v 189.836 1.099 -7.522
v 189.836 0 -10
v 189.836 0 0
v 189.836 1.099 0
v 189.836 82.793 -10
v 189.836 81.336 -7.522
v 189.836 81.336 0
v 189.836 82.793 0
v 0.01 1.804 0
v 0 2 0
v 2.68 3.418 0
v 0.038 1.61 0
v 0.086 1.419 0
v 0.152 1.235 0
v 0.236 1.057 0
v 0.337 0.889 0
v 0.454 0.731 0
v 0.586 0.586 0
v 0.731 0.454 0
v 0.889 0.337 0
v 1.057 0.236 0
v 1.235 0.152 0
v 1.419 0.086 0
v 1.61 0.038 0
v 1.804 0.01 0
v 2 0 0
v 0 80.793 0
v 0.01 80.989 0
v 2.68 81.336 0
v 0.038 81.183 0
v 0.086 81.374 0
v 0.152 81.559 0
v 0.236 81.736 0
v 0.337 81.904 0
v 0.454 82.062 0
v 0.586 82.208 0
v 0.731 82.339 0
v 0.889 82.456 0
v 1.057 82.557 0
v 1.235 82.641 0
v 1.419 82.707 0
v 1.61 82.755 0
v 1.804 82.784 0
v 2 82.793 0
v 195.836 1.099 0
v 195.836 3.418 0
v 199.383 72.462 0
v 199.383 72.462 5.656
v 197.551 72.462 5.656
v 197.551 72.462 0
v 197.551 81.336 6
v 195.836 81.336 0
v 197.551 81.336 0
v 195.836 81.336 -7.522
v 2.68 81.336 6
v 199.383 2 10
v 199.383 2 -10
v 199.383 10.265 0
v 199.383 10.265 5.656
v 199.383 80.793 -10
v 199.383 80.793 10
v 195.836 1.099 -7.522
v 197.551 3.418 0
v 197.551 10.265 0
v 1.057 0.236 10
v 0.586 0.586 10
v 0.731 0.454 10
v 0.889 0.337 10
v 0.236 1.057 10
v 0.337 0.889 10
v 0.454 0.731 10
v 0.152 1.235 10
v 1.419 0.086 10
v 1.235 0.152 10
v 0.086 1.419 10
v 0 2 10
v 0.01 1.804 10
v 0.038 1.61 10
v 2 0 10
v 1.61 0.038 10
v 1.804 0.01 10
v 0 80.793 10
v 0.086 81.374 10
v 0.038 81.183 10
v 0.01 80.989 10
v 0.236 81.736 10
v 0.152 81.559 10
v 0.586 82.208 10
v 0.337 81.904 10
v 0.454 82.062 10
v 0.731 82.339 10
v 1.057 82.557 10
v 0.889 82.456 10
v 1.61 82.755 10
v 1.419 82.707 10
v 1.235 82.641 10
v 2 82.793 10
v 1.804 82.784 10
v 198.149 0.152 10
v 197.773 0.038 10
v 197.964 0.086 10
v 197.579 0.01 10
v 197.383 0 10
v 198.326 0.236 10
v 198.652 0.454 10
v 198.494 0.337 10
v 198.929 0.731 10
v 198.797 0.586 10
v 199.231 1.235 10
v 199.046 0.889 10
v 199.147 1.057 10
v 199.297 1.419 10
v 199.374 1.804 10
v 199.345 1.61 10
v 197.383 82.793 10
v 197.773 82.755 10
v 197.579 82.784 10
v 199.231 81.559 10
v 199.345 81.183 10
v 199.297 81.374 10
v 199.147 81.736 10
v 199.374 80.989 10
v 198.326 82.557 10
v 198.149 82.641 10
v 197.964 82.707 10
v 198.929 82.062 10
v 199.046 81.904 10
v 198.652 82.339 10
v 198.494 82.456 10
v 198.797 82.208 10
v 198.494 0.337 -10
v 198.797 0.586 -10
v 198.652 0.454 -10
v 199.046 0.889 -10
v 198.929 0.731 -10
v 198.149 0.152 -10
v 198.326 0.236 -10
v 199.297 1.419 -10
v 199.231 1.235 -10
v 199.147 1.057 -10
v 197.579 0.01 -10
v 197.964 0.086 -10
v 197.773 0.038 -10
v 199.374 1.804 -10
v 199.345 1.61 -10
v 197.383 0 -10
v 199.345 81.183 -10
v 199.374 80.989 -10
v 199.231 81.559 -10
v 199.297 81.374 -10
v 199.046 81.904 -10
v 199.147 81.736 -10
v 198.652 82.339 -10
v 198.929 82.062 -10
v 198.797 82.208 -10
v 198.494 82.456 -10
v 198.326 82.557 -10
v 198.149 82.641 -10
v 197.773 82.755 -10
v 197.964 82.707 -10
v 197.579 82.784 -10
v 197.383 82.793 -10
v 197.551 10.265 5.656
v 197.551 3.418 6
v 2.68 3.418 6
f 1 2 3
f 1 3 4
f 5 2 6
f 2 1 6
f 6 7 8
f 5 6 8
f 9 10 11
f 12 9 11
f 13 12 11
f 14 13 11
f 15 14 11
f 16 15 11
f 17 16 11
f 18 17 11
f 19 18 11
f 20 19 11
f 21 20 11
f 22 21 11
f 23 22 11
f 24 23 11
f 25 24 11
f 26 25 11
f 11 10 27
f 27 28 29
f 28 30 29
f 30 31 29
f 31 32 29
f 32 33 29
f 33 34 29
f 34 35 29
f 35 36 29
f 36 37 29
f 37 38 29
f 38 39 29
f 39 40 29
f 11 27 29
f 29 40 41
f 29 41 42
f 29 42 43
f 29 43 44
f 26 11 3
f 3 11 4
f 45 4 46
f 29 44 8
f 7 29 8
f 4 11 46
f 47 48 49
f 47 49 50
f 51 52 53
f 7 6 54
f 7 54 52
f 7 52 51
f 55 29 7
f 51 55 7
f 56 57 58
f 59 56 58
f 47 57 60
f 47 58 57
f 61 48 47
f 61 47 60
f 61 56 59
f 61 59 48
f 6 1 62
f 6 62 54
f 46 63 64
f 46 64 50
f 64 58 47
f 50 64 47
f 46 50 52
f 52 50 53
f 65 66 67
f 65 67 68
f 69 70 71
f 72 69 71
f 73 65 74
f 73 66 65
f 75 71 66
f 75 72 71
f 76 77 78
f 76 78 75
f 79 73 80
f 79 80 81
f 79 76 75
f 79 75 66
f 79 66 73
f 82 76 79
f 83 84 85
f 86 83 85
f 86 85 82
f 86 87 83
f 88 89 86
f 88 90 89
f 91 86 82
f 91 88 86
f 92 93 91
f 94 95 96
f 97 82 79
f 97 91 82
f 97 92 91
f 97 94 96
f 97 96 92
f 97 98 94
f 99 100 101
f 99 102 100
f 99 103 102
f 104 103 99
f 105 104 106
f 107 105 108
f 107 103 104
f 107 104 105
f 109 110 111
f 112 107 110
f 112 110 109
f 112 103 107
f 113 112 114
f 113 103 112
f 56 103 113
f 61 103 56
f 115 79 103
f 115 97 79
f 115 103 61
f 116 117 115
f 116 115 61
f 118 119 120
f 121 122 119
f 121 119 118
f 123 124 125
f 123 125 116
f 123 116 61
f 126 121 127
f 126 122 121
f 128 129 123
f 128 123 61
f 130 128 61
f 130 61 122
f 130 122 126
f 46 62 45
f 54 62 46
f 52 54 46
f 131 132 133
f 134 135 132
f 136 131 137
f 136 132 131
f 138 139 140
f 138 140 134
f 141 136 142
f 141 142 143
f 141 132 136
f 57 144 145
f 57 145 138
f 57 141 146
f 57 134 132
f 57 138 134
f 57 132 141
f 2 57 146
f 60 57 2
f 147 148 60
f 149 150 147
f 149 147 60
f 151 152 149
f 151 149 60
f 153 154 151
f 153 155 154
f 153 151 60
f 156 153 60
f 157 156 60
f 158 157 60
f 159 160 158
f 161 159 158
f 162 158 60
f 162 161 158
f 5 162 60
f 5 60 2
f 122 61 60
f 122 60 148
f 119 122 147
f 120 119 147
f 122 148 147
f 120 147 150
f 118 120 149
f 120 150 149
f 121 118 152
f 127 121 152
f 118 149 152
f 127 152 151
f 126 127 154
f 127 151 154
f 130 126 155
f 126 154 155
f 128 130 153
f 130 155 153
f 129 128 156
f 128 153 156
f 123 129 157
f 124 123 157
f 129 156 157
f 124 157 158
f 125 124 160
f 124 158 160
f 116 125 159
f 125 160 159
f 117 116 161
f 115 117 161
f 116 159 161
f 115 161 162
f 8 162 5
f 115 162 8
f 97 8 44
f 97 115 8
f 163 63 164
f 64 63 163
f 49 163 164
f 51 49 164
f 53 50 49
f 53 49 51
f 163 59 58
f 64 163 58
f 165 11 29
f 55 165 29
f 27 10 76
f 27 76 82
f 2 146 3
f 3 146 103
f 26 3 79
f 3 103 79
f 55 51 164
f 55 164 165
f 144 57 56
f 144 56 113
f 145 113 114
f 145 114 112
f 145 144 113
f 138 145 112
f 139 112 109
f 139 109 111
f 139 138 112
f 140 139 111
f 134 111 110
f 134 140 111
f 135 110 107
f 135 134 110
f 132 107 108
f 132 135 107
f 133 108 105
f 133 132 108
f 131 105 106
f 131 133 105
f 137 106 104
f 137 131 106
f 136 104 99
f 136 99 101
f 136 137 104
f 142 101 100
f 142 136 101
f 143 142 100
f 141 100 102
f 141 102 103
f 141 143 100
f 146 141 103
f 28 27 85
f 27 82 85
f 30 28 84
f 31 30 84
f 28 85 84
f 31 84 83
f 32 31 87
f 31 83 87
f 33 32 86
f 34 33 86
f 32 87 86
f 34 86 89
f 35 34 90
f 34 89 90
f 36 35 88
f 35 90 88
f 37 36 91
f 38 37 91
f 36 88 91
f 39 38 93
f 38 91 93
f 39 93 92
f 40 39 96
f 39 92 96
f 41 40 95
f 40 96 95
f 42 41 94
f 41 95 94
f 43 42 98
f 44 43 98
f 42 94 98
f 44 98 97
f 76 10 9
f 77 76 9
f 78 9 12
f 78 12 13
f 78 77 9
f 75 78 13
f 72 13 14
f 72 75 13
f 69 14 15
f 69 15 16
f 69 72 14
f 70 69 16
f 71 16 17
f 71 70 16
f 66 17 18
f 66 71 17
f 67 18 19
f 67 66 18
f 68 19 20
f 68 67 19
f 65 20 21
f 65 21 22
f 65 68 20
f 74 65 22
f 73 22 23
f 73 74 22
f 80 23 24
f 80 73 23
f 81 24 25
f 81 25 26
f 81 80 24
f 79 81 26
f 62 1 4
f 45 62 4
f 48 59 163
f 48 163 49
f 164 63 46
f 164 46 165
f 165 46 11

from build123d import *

# Parameters (mm, degrees)
ESQUISSE1_W             = 199.383138687
ESQUISSE1_H             = 82.793301959
BOSS_EXTRU_1_DEPTH      = 10
ESQUISSE2_W             = 9.546755773
ESQUISSE2_H             = 82.793301959
BOSS_EXTRU_3_DEPTH      = 10
ESQUISSE3_W             = 7.522297827
ESQUISSE3_H             = 80.237843489
ENL_V_MAT_EXTRU_1_DEPTH = 6
ESQUISSE4_W             = 194.871216777
ESQUISSE4_H             = 77.918512405
ENL_V_MAT_EXTRU_2_DEPTH = 6
ESQUISSE5_W             = 5.655894549
ESQUISSE5_H             = 62.197790312
ENL_V_MAT_EXTRU_3_DEPTH = 6
CONG_1_R                = 2
CONG_2_R                = 2
CONG_3_R                = 2
CONG_4_R                = 2


with BuildPart() as part:
    # Esquisse1 → Boss.-Extru.1 (new body)
    with BuildSketch(Plane.XY):
        with Locations((99.691569344, 41.39665098)):
            Rectangle(ESQUISSE1_W, ESQUISSE1_H)
    extrude(amount=BOSS_EXTRU_1_DEPTH)

    # Esquisse2 → Boss.-Extru.3 (add)
    with BuildSketch(Plane(origin=(0, 0, 0), x_dir=(-1, 0, 0), z_dir=(0, 0, -1))):
        with Locations((-194.6097608, 41.39665098)):
            Rectangle(ESQUISSE2_W, ESQUISSE2_H)
    extrude(amount=BOSS_EXTRU_3_DEPTH)

    # Esquisse3 → Enlèv. mat.-Extru.1 (cut)
    with BuildSketch(Plane.ZY.offset(-189.836382914)):
        with Locations((-3.761148914, 41.217548651)):
            Rectangle(ESQUISSE3_W, ESQUISSE3_H)
    extrude(amount=-ENL_V_MAT_EXTRU_1_DEPTH, mode=Mode.SUBTRACT)

    # Esquisse4 → Enlèv. mat.-Extru.2 (cut)
    with BuildSketch(Plane(origin=(0, 0, 0), x_dir=(-1, 0, 0), z_dir=(0, 0, -1))):
        with Locations((-100.115772064, 42.377214193)):
            Rectangle(ESQUISSE4_W, ESQUISSE4_H)
    extrude(amount=-ENL_V_MAT_EXTRU_2_DEPTH, mode=Mode.SUBTRACT)

    # Esquisse5 → Enlèv. mat.-Extru.3 (cut)
    with BuildSketch(Plane(origin=(199.383138687, 0, 0), x_dir=(0, 0, -1), z_dir=(1, 0, 0))):
        with Locations((-2.827947275, 41.363585287)):
            Rectangle(ESQUISSE5_W, ESQUISSE5_H)
    extrude(amount=-ENL_V_MAT_EXTRU_3_DEPTH, mode=Mode.SUBTRACT)

    # Congé1
    cong_1_edges = [part.edges().sort_by_distance(p)[0] for p in [
        (199.383138687, 0, 0),
    ]]
    fillet(cong_1_edges, radius=CONG_1_R)

    # Congé2
    cong_2_edges = [part.edges().sort_by_distance(p)[0] for p in [
        (199.383138687, 82.793301959, 0),
    ]]
    fillet(cong_2_edges, radius=CONG_2_R)

    # Congé3
    cong_3_edges = [part.edges().sort_by_distance(p)[0] for p in [
        (0, 82.793301959, 5),
    ]]
    fillet(cong_3_edges, radius=CONG_3_R)

    # Congé4
    cong_4_edges = [part.edges().sort_by_distance(p)[0] for p in [
        (0, 0, 5),
    ]]
    fillet(cong_4_edges, radius=CONG_4_R)


solid = part.part
